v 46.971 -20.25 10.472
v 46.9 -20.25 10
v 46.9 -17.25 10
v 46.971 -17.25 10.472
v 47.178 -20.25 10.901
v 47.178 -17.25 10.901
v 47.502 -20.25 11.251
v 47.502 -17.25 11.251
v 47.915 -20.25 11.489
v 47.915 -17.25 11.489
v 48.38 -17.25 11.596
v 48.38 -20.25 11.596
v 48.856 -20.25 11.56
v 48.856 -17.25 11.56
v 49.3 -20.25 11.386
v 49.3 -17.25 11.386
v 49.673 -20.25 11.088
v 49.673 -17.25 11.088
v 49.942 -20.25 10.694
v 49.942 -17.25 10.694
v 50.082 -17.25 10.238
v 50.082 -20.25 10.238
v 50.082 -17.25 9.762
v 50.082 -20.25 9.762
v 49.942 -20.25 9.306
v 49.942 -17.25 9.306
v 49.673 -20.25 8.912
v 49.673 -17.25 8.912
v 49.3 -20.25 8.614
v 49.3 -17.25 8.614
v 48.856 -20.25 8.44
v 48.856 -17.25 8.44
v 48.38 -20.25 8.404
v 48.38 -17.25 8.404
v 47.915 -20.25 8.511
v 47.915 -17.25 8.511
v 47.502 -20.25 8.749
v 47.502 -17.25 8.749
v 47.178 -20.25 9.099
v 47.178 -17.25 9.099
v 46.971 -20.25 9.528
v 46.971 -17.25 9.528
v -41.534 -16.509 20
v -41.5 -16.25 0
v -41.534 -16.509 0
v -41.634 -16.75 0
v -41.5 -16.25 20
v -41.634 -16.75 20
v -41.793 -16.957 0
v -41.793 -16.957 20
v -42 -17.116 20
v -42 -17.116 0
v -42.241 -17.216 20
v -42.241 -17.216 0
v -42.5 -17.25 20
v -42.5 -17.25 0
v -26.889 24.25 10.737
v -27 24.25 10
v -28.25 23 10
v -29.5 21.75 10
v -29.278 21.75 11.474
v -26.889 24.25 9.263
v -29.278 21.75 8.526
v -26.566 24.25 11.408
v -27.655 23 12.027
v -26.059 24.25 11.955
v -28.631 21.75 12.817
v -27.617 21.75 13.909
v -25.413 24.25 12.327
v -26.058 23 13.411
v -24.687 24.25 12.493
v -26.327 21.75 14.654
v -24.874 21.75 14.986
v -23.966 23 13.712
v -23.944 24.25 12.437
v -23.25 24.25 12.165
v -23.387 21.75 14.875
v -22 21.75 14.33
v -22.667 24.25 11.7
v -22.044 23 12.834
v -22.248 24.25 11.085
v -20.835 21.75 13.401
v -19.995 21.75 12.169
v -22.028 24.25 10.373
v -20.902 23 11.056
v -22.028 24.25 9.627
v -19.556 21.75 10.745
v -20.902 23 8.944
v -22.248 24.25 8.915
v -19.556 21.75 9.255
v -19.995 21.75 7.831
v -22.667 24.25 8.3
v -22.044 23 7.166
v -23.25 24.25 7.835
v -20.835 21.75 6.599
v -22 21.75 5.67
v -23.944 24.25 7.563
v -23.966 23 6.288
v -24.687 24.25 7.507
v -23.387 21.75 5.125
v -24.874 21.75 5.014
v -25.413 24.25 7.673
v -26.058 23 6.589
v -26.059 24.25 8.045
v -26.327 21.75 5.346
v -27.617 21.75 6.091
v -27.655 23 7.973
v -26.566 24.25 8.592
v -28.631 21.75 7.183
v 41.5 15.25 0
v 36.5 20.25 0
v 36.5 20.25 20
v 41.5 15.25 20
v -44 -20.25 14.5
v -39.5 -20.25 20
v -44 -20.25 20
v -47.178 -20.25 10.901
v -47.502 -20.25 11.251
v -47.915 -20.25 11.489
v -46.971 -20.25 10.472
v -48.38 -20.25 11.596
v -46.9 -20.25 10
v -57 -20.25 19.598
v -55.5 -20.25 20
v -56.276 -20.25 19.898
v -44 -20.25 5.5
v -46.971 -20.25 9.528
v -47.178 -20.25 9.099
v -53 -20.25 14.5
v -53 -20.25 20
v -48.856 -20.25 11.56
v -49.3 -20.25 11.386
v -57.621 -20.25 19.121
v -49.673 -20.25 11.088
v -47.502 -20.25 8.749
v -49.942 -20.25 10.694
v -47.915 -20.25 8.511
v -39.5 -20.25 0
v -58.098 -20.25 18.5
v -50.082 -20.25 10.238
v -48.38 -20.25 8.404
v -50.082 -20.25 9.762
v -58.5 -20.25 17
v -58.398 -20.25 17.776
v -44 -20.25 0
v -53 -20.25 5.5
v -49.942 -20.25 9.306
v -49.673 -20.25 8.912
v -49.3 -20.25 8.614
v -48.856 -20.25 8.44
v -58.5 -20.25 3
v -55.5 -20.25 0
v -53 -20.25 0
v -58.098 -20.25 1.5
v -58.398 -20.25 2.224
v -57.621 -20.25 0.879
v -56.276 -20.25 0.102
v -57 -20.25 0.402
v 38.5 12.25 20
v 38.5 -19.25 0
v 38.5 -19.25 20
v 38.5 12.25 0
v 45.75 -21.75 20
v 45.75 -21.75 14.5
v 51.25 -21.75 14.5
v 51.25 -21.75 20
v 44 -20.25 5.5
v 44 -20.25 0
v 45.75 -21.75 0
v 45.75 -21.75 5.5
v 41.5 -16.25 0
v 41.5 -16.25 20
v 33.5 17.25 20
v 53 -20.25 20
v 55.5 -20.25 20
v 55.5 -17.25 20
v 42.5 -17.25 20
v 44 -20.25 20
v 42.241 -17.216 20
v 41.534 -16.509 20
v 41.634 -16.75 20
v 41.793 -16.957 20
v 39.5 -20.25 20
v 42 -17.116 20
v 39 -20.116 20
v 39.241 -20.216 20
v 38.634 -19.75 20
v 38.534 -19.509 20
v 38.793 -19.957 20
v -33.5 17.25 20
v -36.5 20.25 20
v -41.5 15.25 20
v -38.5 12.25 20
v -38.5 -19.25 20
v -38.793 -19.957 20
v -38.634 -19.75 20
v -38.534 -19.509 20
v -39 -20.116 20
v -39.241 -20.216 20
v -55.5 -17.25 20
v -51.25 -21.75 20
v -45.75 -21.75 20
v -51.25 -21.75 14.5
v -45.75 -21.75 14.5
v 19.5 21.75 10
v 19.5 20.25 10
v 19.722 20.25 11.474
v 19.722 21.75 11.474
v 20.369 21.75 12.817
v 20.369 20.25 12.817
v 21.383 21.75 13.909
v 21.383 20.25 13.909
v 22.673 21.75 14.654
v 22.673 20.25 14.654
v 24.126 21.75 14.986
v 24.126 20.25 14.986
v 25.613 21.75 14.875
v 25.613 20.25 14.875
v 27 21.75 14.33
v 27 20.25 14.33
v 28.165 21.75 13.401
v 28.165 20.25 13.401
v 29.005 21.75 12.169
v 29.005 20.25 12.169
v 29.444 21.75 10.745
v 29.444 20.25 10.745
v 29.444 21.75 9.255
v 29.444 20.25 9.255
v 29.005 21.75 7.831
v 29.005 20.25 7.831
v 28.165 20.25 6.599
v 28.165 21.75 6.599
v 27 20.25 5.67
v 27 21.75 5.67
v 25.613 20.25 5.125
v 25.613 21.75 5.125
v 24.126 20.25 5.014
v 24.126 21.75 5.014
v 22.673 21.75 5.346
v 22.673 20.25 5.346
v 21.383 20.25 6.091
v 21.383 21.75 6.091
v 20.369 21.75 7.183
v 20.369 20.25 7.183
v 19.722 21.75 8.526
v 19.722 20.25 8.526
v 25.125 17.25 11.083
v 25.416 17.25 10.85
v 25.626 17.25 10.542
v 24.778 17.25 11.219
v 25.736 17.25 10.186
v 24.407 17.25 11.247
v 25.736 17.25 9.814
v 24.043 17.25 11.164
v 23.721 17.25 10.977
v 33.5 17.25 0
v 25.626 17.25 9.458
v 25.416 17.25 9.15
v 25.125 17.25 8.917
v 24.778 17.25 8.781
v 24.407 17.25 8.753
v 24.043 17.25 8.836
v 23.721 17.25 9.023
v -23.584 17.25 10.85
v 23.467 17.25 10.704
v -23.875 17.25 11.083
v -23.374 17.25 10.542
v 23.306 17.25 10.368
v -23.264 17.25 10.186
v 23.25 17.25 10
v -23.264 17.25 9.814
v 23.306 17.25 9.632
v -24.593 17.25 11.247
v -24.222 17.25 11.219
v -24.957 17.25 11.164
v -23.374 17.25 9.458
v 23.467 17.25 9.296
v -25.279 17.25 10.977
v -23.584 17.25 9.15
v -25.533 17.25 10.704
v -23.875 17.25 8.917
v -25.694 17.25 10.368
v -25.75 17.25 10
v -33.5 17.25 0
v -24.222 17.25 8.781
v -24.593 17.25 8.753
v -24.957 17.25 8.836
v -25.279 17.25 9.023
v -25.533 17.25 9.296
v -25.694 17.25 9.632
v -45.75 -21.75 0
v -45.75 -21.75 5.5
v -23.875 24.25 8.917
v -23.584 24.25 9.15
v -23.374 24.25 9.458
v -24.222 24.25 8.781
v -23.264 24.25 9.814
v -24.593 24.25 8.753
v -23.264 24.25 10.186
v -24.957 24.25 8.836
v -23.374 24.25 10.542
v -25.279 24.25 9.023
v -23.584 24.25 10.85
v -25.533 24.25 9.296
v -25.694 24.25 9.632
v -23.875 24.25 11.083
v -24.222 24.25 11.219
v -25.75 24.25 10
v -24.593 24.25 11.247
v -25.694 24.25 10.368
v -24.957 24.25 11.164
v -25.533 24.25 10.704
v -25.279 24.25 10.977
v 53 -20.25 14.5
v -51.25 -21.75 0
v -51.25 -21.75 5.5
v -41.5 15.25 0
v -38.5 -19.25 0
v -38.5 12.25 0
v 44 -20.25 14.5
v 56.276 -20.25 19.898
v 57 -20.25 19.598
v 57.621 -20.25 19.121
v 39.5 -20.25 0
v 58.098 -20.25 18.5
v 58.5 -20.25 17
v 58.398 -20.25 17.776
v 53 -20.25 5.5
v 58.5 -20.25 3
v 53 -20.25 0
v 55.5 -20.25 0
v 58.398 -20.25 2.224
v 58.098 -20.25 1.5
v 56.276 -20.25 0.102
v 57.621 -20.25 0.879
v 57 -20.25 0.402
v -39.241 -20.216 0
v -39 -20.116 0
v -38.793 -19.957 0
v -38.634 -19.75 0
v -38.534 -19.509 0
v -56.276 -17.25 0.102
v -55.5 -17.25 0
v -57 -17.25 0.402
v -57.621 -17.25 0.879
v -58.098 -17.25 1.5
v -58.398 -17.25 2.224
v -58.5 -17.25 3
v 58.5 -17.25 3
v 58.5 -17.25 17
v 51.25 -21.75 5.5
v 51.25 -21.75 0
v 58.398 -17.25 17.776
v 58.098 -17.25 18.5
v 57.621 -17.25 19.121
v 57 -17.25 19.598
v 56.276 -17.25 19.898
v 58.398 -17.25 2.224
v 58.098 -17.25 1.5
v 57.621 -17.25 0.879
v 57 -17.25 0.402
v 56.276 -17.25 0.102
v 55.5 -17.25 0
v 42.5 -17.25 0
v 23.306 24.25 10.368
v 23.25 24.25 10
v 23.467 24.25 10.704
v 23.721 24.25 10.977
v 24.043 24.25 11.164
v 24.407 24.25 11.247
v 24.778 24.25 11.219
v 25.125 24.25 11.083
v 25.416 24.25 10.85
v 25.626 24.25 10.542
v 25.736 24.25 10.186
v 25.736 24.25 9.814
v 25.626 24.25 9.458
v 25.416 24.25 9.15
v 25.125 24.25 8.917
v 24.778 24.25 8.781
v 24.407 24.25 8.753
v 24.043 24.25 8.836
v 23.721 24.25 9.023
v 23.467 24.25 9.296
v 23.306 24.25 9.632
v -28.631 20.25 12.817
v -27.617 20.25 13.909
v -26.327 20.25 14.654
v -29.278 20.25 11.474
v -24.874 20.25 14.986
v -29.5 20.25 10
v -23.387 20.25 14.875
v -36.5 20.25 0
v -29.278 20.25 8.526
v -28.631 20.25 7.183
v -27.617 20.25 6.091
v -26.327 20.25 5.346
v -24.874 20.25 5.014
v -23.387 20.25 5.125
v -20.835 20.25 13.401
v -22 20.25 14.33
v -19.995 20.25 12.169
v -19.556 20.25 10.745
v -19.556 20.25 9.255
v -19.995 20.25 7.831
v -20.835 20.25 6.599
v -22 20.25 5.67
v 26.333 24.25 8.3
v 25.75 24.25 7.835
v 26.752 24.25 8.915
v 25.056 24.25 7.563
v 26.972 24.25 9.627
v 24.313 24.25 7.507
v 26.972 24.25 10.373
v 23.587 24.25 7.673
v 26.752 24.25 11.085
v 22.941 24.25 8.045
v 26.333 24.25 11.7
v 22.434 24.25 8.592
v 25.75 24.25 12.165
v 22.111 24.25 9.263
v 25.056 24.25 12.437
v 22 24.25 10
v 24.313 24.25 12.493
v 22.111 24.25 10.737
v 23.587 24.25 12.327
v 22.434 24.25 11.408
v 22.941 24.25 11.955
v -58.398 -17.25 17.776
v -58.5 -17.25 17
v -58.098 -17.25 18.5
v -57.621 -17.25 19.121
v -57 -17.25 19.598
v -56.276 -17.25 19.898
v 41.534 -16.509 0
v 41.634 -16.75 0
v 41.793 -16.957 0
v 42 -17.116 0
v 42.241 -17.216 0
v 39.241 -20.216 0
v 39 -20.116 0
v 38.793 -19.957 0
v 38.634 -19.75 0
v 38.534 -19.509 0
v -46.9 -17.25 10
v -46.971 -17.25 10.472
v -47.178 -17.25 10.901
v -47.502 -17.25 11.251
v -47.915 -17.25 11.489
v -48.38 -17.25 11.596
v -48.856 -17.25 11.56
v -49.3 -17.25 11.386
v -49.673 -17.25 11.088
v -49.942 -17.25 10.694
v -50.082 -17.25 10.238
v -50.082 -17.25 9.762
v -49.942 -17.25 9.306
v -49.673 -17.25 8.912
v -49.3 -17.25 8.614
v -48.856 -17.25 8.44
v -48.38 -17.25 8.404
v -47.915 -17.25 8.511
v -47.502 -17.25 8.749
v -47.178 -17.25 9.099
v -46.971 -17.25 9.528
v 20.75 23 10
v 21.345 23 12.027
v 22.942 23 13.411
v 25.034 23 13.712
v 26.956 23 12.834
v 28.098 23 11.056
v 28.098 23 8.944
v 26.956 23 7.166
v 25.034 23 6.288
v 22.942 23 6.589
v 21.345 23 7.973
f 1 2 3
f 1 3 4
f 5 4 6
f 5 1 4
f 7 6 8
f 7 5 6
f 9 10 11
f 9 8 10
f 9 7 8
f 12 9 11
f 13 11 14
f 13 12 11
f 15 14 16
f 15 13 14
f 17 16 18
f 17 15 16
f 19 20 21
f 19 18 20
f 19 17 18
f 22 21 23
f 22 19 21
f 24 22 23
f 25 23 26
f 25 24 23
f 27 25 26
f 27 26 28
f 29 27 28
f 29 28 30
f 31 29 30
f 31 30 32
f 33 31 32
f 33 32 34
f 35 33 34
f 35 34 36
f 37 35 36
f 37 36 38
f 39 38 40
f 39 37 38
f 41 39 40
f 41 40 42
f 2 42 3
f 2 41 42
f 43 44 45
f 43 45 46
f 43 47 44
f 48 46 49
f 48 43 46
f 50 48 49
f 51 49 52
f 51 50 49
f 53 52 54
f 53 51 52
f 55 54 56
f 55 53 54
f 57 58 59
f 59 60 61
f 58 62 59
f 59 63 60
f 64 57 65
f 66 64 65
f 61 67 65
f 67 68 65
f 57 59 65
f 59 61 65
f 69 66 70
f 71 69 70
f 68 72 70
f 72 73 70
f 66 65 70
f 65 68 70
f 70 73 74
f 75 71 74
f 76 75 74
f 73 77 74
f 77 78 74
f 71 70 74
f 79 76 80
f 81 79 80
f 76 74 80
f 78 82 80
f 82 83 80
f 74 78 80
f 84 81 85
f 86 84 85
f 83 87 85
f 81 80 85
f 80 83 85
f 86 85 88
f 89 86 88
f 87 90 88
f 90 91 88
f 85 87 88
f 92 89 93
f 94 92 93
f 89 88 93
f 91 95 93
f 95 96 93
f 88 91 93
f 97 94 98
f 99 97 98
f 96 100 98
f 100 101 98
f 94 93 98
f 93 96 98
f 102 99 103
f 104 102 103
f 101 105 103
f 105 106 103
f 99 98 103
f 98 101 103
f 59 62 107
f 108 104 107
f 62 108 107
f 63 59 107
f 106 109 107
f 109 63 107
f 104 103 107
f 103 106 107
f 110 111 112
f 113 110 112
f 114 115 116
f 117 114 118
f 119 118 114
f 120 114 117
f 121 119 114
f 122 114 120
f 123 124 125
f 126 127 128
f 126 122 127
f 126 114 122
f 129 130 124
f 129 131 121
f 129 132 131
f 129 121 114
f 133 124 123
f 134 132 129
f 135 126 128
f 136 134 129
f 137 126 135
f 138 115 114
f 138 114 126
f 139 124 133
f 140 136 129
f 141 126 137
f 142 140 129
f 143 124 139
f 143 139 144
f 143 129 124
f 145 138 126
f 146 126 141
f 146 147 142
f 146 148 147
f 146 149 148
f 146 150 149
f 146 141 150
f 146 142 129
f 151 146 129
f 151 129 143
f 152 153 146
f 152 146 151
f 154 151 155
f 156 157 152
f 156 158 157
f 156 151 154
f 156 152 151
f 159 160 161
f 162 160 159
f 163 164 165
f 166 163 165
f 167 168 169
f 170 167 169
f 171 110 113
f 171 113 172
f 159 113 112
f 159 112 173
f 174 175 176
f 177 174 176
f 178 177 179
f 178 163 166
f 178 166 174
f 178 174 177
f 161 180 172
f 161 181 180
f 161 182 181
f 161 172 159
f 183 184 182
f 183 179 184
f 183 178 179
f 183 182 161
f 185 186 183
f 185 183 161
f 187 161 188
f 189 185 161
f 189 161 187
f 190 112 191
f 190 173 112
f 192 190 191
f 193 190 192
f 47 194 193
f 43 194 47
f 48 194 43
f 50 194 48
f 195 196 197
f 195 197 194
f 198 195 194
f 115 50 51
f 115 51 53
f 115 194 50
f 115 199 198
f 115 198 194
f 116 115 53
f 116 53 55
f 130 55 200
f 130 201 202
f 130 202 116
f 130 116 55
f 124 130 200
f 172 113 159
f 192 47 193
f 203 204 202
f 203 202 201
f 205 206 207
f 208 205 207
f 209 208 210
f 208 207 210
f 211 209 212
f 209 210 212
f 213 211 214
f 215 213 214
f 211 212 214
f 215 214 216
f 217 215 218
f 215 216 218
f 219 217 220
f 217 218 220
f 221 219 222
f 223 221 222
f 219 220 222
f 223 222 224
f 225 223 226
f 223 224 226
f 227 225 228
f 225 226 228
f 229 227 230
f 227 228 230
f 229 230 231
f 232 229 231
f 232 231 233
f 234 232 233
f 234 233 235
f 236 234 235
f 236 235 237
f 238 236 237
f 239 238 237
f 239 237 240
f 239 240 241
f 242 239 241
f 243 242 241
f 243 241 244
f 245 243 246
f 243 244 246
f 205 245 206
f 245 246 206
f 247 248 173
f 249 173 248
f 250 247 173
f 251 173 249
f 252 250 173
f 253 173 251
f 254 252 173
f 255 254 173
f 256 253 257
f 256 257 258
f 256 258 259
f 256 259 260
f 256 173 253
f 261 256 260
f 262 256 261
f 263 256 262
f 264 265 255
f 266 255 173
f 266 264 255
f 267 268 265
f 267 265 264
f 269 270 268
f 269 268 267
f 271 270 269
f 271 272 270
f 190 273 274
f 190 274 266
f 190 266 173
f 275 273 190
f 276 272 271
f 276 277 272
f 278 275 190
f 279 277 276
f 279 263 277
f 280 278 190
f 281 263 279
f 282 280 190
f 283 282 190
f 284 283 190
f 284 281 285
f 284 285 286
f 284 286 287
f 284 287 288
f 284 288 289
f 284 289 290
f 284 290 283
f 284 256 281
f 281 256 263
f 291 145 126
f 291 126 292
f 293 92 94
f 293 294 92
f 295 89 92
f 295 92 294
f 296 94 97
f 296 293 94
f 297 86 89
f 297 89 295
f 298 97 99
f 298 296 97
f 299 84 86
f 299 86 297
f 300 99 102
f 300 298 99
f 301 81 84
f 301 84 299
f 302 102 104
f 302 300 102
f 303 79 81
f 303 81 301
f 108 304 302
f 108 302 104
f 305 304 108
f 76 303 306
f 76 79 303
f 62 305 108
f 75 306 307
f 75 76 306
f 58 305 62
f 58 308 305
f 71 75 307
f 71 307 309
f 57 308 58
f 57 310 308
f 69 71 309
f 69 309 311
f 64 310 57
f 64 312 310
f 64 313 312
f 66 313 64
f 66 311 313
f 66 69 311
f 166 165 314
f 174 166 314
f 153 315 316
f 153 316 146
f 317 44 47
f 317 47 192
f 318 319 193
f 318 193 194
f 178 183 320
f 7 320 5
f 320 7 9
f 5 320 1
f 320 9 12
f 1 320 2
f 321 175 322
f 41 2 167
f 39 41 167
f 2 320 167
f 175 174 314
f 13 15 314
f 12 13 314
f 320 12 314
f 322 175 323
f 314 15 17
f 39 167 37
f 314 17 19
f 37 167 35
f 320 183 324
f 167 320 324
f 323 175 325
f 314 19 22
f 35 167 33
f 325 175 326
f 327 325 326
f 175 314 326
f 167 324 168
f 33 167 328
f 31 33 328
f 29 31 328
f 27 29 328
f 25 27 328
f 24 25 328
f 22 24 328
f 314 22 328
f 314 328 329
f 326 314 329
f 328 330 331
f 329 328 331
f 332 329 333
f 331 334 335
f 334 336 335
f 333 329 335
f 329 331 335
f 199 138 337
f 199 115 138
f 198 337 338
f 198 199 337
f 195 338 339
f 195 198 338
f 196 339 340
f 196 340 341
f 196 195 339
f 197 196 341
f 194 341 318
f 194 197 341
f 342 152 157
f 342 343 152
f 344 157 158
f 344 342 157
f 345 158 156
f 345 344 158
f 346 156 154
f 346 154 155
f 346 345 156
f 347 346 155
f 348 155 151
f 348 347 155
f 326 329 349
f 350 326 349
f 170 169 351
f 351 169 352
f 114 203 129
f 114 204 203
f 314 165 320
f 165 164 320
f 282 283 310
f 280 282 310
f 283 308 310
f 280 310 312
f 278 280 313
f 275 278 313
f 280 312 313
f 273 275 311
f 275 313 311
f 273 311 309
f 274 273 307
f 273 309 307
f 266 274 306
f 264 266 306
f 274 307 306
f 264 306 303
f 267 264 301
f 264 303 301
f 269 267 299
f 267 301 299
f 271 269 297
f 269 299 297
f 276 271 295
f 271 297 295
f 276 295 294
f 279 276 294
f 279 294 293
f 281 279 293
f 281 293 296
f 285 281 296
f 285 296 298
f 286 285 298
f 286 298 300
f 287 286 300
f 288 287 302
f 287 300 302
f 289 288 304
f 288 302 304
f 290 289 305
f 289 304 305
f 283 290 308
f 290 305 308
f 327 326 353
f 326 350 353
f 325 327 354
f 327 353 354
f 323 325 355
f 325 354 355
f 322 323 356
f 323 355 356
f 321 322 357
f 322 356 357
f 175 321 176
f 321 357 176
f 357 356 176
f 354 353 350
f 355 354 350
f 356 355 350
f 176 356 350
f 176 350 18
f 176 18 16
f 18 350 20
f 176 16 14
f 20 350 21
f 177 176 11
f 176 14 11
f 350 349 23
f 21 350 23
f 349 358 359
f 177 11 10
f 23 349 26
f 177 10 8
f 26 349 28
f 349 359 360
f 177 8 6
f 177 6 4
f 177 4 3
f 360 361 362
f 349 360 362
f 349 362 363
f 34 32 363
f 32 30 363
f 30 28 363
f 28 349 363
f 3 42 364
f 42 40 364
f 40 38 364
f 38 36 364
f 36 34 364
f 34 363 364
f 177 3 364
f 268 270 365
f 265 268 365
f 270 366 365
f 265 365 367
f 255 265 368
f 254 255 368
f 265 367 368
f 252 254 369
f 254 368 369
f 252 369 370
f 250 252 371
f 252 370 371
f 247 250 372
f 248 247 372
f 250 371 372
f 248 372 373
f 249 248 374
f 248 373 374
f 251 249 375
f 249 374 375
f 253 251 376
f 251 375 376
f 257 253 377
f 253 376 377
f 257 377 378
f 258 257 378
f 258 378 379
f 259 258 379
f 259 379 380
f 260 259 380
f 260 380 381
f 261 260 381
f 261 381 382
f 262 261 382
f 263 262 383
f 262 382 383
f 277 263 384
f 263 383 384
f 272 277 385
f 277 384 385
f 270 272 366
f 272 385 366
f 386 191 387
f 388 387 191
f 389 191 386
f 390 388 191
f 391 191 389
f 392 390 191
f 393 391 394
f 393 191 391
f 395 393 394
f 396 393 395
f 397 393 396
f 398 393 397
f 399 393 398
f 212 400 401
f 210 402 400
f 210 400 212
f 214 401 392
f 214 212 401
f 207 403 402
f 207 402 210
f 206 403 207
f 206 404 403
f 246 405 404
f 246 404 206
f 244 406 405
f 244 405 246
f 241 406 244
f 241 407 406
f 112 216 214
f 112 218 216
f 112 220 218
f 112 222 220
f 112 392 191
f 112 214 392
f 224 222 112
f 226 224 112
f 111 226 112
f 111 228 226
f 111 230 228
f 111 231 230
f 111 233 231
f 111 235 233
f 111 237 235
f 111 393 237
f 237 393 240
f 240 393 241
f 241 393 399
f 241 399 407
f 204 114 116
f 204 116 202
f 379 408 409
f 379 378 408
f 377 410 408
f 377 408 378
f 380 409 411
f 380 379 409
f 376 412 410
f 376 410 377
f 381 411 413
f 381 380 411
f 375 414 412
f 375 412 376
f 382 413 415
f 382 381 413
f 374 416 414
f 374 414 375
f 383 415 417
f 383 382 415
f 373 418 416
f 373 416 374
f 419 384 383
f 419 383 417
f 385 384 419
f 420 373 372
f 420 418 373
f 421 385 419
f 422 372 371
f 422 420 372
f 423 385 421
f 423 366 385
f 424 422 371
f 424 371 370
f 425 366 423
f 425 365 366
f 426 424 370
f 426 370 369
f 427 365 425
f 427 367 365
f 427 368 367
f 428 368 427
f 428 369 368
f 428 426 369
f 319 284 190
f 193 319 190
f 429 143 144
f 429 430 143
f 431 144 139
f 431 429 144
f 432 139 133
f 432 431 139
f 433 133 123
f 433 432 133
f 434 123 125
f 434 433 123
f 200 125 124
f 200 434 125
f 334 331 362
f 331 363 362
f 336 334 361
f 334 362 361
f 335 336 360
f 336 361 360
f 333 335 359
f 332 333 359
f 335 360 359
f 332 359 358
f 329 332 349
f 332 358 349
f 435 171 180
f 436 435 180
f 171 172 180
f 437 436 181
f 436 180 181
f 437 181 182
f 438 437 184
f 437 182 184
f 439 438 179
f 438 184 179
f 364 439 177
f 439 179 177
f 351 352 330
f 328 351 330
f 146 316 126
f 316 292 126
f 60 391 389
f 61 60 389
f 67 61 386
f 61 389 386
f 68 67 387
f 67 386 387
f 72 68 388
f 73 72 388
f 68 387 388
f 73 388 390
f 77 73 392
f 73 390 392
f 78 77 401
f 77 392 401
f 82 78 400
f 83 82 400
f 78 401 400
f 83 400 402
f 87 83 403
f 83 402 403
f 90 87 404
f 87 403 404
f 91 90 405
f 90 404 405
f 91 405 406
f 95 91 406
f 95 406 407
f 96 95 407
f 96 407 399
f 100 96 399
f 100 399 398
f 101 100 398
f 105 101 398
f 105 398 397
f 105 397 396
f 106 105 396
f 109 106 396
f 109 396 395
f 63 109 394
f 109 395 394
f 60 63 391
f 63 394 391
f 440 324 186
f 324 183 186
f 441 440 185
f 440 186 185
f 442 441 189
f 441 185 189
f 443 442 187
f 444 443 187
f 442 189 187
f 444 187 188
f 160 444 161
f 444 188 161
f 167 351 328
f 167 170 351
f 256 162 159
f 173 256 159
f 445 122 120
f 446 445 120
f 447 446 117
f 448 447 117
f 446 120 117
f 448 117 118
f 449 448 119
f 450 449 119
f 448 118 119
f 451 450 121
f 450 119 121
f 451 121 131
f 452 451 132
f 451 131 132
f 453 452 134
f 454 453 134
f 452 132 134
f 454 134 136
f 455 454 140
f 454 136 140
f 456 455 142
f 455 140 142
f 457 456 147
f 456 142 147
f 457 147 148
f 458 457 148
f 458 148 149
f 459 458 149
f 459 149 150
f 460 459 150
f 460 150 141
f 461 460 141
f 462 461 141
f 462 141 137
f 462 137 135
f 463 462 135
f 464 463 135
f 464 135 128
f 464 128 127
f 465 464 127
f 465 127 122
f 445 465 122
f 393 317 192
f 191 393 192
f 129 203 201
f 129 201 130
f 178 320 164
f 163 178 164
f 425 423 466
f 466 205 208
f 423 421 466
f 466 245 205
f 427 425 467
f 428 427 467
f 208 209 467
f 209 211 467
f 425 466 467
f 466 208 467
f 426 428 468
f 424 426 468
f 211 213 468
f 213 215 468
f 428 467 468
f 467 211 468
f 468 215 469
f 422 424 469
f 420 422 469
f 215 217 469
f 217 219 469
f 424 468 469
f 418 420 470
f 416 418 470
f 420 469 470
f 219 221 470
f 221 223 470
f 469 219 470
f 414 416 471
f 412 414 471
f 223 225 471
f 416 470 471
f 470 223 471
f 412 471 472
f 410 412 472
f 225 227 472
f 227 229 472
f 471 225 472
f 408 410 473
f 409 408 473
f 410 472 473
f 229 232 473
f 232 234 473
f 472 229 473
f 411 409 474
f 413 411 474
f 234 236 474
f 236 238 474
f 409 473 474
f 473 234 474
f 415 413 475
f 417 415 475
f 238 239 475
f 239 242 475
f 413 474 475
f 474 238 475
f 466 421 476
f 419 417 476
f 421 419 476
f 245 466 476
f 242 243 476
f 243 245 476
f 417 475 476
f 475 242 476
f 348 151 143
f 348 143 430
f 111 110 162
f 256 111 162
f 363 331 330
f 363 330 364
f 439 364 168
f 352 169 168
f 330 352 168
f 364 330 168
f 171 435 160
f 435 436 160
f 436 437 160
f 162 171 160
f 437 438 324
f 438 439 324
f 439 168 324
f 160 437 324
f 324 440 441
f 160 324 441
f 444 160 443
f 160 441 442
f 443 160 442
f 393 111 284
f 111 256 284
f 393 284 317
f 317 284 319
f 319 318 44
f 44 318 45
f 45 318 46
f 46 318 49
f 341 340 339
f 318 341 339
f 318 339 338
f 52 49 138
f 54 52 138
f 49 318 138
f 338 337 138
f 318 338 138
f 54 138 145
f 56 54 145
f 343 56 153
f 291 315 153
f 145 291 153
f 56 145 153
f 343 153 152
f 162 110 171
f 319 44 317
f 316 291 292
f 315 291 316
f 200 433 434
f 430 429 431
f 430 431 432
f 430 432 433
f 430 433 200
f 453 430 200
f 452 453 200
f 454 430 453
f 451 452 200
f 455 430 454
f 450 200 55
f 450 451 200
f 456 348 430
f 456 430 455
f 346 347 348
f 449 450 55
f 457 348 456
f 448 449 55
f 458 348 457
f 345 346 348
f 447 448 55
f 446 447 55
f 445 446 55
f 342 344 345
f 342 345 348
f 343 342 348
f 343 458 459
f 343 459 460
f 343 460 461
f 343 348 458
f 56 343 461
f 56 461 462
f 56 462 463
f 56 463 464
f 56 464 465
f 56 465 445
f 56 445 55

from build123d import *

# Parameters (mm, degrees)
PAD_DEPTH       = 20
PAD001_DEPTH    = 20
SKETCH002_R     = 1.6
POCKET_DEPTH    = 262.582051
SKETCH003_W     = 9
SKETCH003_H     = 9
POCKET001_DEPTH = 1.5
CHAMFER_SIZE    = 5
FILLET_R        = 1
FILLET001_R     = 3
SKETCH004_R     = 5
SKETCH004_R_2   = 1.25
PAD002_DEPTH    = 4
SKETCH005_R     = 1.25
POCKET002_DEPTH = 46.001
CHAMFER001_SIZE = 2.5


with BuildPart() as part:
    # Sketch → Pad (new body)
    with BuildSketch(Plane.XY):
        Polygon((-41.5, -20.25), (-41.5, 20.25), (41.5, 20.25), (41.5, -20.25), (38.5, -20.25), (38.5, 17.25), (-38.5, 17.25), (-38.5, -20.25), align=None)
    extrude(amount=PAD_DEPTH)

    # Sketch001 (on Face9 of Pad) → Pad001 (join)
    with BuildSketch(Plane(origin=(0, 0, 0), x_dir=(1, 0, 0), z_dir=(0, 0, -1))):
        Polygon((-58.5, 20.25), (-58.5, 17.25), (-41.5, 17.25), (-41.5, 20.25), (-44, 20.25), (-45.75, 21.75), (-51.25, 21.75), (-53, 20.25), align=None)
    pad001 = extrude(amount=-PAD001_DEPTH)

    # Sketch002 (on Face2 of Pad001) → Pocket (cut, through all)
    with BuildSketch(Plane.XZ.offset(21.75)):
        with Locations((-48.5, 10)):
            Circle(SKETCH002_R)
    pocket = extrude(amount=-POCKET_DEPTH, mode=Mode.SUBTRACT)

    # Sketch003 (on Face5 of Pocket) → Pocket001 (cut)
    with BuildSketch(Plane.XZ.offset(21.75)):
        with Locations((-48.5, 10)):
            Rectangle(SKETCH003_W, SKETCH003_H)
    pocket001 = extrude(amount=-POCKET001_DEPTH, mode=Mode.SUBTRACT)

    # Mirrored: Pad001, Pocket, Pocket001 across Sketch001 V_Axis
    add(pad001.mirror(Plane(origin=(0, 0, 0), x_dir=(0, 0, -1), z_dir=(1, 0, 0))))
    add(pocket.mirror(Plane(origin=(0, 0, 0), x_dir=(0, 0, -1), z_dir=(1, 0, 0))), mode=Mode.SUBTRACT)
    add(pocket001.mirror(Plane(origin=(0, 0, 0), x_dir=(0, 0, -1), z_dir=(1, 0, 0))), mode=Mode.SUBTRACT)

    # Chamfer
    chamfer_edges = [part.edges().sort_by_distance(p)[0] for p in [
        (41.5, 20.25, 10),
        (38.5, 17.25, 10),
        (-41.5, 20.25, 10),
        (-38.5, 17.25, 10),
    ]]
    chamfer(chamfer_edges, length=CHAMFER_SIZE)

    # Fillet
    fillet_edges = [part.edges().sort_by_distance(p)[0] for p in [
        (38.5, -20.25, 10),
        (-38.5, -20.25, 10),
        (-41.5, -17.25, 10),
        (41.5, -17.25, 10),
    ]]
    fillet(fillet_edges, radius=FILLET_R)

    # Fillet001
    fillet001_edges = [part.edges().sort_by_distance(p)[0] for p in [
        (58.5, -18.75, 0),
        (58.5, -18.75, 20),
        (-58.5, -18.75, 0),
        (-58.5, -18.75, 20),
    ]]
    fillet(fillet001_edges, radius=FILLET001_R)

    # Sketch004 (on Face10 of Fillet001) → Pad002 (join)
    with BuildSketch(Plane(origin=(0, 20.25, 0), x_dir=(-1, 0, 0), z_dir=(0, 1, 0))):
        with Locations((-24.5, 10)):
            Circle(SKETCH004_R)
        with Locations((-24.5, 10)):
            Circle(SKETCH004_R_2, mode=Mode.SUBTRACT)
        with Locations((24.5, 10)):
            Circle(SKETCH004_R)
        with Locations((24.5, 10)):
            Circle(SKETCH004_R_2, mode=Mode.SUBTRACT)
    extrude(amount=PAD002_DEPTH)

    # Sketch005 (on Face47 of Pad002) → Pocket002 (cut, through all)
    with BuildSketch(Plane(origin=(0, 24.25, 0), x_dir=(-1, 0, 0), z_dir=(0, 1, 0))):
        with Locations((24.5, 10)):
            Circle(SKETCH005_R)
        with Locations((-24.5, 10)):
            Circle(SKETCH005_R)
    extrude(amount=-POCKET002_DEPTH, mode=Mode.SUBTRACT)

    # Chamfer001
    chamfer001_edges = [part.edges().sort_by_distance(p)[0] for p in [
        (29.5, 24.25, 10),
        (-19.5, 24.25, 10),
    ]]
    chamfer(chamfer001_edges, length=CHAMFER001_SIZE)


solid = part.part
